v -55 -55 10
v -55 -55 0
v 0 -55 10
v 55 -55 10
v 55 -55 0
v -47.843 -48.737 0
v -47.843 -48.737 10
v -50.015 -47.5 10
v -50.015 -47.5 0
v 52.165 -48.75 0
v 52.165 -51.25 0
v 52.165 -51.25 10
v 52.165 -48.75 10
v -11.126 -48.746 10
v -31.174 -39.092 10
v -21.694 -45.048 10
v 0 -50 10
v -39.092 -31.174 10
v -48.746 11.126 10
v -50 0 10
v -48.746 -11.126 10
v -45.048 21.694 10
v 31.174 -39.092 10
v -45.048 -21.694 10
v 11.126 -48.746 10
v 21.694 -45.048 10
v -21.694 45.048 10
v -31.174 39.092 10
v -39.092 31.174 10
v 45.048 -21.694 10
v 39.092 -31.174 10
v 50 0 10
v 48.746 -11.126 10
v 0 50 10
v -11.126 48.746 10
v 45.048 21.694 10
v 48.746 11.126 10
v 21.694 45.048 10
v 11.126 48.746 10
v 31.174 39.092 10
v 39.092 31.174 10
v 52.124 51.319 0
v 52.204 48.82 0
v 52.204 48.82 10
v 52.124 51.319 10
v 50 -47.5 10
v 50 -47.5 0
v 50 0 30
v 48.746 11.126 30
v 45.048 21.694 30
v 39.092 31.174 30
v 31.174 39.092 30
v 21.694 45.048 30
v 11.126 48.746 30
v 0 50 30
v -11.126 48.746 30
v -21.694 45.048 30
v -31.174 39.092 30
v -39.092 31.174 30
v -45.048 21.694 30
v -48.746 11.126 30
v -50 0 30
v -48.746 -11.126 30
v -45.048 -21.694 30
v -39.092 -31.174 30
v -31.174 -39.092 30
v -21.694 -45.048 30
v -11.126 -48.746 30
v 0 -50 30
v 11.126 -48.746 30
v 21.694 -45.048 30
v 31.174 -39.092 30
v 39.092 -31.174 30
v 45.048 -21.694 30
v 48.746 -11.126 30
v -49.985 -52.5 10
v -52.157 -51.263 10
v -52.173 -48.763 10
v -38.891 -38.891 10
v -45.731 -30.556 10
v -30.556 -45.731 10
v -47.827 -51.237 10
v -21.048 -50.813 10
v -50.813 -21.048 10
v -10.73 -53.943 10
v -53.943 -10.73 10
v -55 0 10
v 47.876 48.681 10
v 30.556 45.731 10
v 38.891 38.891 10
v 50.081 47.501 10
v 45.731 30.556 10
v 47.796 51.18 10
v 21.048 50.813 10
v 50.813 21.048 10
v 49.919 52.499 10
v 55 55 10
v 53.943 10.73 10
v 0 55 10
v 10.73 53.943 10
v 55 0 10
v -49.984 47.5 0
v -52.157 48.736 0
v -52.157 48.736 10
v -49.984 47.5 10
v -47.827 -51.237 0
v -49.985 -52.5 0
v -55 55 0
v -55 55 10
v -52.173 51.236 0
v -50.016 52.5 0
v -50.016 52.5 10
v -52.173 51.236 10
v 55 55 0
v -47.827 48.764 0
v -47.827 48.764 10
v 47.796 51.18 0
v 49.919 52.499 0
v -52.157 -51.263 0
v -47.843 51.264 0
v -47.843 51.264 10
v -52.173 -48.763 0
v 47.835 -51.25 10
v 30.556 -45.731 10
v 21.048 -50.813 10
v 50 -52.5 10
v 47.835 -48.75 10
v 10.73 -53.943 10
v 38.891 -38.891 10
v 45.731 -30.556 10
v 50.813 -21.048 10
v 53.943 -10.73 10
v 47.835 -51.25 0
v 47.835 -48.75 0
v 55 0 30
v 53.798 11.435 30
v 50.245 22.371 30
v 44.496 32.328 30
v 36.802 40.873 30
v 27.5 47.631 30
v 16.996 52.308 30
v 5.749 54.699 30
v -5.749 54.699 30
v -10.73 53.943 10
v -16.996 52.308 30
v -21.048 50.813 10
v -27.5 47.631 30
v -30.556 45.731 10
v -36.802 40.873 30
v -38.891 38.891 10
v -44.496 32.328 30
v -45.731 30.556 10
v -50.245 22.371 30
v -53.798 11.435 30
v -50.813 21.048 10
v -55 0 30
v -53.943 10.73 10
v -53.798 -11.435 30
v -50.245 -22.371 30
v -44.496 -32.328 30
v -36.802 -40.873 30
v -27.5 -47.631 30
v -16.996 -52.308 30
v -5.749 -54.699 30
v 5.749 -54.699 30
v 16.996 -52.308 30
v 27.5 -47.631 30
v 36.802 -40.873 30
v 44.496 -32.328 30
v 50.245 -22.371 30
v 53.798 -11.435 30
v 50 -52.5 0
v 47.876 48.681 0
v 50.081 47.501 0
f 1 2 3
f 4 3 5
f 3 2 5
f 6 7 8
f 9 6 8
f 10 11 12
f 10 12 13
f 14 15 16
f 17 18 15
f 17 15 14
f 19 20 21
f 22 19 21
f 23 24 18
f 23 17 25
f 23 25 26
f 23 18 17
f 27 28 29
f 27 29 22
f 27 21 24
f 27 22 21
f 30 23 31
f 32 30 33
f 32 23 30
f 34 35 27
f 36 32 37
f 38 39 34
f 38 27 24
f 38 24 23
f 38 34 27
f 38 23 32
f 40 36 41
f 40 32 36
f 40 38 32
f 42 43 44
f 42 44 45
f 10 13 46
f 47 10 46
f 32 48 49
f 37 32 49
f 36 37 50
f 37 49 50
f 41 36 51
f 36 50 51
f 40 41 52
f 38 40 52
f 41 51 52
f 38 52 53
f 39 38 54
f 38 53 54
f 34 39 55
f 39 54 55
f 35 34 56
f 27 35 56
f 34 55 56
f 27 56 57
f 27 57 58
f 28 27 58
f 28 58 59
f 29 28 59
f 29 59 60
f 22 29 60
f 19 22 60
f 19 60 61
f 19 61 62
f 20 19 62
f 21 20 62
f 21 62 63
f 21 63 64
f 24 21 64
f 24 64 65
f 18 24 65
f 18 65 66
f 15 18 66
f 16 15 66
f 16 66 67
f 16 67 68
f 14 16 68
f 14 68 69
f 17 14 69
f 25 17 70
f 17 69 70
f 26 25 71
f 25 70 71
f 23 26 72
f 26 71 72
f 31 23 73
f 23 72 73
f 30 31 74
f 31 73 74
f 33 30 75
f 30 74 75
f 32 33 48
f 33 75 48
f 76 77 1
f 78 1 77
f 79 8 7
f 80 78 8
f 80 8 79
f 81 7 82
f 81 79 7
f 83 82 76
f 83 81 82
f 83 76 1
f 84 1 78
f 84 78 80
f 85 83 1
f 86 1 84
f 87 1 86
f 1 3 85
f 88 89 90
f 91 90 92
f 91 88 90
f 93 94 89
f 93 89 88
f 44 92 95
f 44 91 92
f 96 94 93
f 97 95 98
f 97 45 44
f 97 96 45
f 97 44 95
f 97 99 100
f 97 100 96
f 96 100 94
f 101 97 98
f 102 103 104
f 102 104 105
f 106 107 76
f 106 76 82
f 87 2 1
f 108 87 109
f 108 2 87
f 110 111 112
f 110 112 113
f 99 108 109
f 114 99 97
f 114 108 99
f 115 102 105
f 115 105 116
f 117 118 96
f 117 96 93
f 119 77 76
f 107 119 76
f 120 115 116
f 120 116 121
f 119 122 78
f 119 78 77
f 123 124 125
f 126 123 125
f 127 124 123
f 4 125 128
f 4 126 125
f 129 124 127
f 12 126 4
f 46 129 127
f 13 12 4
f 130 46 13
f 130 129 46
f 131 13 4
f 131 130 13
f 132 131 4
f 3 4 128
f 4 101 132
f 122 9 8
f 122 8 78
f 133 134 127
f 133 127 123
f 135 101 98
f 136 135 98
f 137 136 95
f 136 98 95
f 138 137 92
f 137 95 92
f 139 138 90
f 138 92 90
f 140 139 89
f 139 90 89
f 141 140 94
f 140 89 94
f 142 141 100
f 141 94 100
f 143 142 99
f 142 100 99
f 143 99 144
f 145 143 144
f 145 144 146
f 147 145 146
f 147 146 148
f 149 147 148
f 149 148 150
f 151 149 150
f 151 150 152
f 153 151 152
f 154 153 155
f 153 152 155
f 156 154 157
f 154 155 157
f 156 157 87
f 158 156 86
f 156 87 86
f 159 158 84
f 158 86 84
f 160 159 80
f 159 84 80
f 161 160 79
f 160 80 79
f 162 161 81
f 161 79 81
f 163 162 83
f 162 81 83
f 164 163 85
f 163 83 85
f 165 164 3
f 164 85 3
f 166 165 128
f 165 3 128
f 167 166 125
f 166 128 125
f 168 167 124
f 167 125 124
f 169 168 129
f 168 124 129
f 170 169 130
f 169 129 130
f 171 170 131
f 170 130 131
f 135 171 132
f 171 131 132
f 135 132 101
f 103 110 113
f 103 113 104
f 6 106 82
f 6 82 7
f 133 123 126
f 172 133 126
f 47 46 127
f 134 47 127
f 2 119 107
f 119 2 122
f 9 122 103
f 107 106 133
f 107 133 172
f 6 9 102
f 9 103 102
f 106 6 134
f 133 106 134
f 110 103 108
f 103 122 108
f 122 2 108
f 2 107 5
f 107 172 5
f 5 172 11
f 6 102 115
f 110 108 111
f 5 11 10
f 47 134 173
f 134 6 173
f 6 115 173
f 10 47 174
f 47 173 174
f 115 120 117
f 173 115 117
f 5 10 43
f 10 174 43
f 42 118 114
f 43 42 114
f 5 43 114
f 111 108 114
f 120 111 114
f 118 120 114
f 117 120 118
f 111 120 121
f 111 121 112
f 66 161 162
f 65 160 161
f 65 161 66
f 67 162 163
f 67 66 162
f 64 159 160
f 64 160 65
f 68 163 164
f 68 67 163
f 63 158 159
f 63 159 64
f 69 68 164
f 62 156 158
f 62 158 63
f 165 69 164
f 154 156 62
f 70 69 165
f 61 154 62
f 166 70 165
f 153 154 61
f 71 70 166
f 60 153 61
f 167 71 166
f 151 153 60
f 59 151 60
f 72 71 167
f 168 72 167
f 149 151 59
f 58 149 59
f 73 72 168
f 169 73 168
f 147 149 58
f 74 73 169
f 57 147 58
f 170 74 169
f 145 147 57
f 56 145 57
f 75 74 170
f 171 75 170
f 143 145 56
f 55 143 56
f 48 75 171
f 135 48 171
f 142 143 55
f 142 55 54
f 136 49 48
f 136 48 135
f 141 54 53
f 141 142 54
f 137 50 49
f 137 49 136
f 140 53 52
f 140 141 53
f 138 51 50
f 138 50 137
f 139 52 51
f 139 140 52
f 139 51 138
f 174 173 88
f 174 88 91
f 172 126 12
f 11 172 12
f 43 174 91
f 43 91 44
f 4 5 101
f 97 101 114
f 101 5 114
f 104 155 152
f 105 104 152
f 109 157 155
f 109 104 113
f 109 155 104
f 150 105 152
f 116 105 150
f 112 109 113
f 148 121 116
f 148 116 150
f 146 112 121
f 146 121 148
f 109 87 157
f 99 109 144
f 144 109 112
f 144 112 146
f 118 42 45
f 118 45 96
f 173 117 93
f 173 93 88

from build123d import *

# Parameters (mm, degrees)
SKETCH2_R           = 55
BOSS_EXTRUDE2_DEPTH = 30
SKETCH5_R           = 50
CUT_EXTRUDE2_DEPTH  = 21
SKETCH6_W           = 110
SKETCH6_H           = 110
BOSS_EXTRUDE3_DEPTH = 10
CUT_EXTRUDE5_DEPTH  = 23


with BuildPart() as part:
    # Sketch2 → Boss-Extrude2 (new body)
    with BuildSketch(Plane.XY):
        Circle(SKETCH2_R)
    extrude(amount=BOSS_EXTRUDE2_DEPTH)

    # Sketch5 → Cut-Extrude2 (cut)
    with BuildSketch(Plane.XY.offset(30)):
        Circle(SKETCH5_R)
    extrude(amount=-CUT_EXTRUDE2_DEPTH, mode=Mode.SUBTRACT)

    # Sketch6 → Boss-Extrude3 (add)
    with BuildSketch(Plane.XY):
        Rectangle(SKETCH6_W, SKETCH6_H)
    extrude(amount=BOSS_EXTRUDE3_DEPTH)

    # Sketch7 → Cut-Extrude5 (cut)
    with BuildSketch(Plane.XY):
        Polygon((-47.826827432, 48.764151713), (-47.843137704, 51.264098507), (-50.016310272, 52.499946794), (-52.173172568, 51.235848287), (-52.156862296, 48.735901493), (-49.983689728, 47.500053206), align=None)
        Polygon((50.080599261, 47.501299586), (52.204237665, 48.8204508), (52.123638405, 51.319151214), (49.919400739, 52.498700414), (47.795762335, 51.1795492), (47.876361595, 48.680848786), align=None)
        Polygon((52.165063509, -51.25), (52.165063509, -48.75), (50, -47.5), (47.834936491, -48.75), (47.834936491, -51.25), (50, -52.5), align=None)
        Polygon((-49.98483432, -52.499954), (-47.827393488, -51.236843136), (-47.842559168, -48.736889136), (-50.01516568, -47.500046), (-52.172606512, -48.763156864), (-52.157440832, -51.263110864), align=None)
    extrude(amount=CUT_EXTRUDE5_DEPTH, mode=Mode.SUBTRACT)


solid = part.part
